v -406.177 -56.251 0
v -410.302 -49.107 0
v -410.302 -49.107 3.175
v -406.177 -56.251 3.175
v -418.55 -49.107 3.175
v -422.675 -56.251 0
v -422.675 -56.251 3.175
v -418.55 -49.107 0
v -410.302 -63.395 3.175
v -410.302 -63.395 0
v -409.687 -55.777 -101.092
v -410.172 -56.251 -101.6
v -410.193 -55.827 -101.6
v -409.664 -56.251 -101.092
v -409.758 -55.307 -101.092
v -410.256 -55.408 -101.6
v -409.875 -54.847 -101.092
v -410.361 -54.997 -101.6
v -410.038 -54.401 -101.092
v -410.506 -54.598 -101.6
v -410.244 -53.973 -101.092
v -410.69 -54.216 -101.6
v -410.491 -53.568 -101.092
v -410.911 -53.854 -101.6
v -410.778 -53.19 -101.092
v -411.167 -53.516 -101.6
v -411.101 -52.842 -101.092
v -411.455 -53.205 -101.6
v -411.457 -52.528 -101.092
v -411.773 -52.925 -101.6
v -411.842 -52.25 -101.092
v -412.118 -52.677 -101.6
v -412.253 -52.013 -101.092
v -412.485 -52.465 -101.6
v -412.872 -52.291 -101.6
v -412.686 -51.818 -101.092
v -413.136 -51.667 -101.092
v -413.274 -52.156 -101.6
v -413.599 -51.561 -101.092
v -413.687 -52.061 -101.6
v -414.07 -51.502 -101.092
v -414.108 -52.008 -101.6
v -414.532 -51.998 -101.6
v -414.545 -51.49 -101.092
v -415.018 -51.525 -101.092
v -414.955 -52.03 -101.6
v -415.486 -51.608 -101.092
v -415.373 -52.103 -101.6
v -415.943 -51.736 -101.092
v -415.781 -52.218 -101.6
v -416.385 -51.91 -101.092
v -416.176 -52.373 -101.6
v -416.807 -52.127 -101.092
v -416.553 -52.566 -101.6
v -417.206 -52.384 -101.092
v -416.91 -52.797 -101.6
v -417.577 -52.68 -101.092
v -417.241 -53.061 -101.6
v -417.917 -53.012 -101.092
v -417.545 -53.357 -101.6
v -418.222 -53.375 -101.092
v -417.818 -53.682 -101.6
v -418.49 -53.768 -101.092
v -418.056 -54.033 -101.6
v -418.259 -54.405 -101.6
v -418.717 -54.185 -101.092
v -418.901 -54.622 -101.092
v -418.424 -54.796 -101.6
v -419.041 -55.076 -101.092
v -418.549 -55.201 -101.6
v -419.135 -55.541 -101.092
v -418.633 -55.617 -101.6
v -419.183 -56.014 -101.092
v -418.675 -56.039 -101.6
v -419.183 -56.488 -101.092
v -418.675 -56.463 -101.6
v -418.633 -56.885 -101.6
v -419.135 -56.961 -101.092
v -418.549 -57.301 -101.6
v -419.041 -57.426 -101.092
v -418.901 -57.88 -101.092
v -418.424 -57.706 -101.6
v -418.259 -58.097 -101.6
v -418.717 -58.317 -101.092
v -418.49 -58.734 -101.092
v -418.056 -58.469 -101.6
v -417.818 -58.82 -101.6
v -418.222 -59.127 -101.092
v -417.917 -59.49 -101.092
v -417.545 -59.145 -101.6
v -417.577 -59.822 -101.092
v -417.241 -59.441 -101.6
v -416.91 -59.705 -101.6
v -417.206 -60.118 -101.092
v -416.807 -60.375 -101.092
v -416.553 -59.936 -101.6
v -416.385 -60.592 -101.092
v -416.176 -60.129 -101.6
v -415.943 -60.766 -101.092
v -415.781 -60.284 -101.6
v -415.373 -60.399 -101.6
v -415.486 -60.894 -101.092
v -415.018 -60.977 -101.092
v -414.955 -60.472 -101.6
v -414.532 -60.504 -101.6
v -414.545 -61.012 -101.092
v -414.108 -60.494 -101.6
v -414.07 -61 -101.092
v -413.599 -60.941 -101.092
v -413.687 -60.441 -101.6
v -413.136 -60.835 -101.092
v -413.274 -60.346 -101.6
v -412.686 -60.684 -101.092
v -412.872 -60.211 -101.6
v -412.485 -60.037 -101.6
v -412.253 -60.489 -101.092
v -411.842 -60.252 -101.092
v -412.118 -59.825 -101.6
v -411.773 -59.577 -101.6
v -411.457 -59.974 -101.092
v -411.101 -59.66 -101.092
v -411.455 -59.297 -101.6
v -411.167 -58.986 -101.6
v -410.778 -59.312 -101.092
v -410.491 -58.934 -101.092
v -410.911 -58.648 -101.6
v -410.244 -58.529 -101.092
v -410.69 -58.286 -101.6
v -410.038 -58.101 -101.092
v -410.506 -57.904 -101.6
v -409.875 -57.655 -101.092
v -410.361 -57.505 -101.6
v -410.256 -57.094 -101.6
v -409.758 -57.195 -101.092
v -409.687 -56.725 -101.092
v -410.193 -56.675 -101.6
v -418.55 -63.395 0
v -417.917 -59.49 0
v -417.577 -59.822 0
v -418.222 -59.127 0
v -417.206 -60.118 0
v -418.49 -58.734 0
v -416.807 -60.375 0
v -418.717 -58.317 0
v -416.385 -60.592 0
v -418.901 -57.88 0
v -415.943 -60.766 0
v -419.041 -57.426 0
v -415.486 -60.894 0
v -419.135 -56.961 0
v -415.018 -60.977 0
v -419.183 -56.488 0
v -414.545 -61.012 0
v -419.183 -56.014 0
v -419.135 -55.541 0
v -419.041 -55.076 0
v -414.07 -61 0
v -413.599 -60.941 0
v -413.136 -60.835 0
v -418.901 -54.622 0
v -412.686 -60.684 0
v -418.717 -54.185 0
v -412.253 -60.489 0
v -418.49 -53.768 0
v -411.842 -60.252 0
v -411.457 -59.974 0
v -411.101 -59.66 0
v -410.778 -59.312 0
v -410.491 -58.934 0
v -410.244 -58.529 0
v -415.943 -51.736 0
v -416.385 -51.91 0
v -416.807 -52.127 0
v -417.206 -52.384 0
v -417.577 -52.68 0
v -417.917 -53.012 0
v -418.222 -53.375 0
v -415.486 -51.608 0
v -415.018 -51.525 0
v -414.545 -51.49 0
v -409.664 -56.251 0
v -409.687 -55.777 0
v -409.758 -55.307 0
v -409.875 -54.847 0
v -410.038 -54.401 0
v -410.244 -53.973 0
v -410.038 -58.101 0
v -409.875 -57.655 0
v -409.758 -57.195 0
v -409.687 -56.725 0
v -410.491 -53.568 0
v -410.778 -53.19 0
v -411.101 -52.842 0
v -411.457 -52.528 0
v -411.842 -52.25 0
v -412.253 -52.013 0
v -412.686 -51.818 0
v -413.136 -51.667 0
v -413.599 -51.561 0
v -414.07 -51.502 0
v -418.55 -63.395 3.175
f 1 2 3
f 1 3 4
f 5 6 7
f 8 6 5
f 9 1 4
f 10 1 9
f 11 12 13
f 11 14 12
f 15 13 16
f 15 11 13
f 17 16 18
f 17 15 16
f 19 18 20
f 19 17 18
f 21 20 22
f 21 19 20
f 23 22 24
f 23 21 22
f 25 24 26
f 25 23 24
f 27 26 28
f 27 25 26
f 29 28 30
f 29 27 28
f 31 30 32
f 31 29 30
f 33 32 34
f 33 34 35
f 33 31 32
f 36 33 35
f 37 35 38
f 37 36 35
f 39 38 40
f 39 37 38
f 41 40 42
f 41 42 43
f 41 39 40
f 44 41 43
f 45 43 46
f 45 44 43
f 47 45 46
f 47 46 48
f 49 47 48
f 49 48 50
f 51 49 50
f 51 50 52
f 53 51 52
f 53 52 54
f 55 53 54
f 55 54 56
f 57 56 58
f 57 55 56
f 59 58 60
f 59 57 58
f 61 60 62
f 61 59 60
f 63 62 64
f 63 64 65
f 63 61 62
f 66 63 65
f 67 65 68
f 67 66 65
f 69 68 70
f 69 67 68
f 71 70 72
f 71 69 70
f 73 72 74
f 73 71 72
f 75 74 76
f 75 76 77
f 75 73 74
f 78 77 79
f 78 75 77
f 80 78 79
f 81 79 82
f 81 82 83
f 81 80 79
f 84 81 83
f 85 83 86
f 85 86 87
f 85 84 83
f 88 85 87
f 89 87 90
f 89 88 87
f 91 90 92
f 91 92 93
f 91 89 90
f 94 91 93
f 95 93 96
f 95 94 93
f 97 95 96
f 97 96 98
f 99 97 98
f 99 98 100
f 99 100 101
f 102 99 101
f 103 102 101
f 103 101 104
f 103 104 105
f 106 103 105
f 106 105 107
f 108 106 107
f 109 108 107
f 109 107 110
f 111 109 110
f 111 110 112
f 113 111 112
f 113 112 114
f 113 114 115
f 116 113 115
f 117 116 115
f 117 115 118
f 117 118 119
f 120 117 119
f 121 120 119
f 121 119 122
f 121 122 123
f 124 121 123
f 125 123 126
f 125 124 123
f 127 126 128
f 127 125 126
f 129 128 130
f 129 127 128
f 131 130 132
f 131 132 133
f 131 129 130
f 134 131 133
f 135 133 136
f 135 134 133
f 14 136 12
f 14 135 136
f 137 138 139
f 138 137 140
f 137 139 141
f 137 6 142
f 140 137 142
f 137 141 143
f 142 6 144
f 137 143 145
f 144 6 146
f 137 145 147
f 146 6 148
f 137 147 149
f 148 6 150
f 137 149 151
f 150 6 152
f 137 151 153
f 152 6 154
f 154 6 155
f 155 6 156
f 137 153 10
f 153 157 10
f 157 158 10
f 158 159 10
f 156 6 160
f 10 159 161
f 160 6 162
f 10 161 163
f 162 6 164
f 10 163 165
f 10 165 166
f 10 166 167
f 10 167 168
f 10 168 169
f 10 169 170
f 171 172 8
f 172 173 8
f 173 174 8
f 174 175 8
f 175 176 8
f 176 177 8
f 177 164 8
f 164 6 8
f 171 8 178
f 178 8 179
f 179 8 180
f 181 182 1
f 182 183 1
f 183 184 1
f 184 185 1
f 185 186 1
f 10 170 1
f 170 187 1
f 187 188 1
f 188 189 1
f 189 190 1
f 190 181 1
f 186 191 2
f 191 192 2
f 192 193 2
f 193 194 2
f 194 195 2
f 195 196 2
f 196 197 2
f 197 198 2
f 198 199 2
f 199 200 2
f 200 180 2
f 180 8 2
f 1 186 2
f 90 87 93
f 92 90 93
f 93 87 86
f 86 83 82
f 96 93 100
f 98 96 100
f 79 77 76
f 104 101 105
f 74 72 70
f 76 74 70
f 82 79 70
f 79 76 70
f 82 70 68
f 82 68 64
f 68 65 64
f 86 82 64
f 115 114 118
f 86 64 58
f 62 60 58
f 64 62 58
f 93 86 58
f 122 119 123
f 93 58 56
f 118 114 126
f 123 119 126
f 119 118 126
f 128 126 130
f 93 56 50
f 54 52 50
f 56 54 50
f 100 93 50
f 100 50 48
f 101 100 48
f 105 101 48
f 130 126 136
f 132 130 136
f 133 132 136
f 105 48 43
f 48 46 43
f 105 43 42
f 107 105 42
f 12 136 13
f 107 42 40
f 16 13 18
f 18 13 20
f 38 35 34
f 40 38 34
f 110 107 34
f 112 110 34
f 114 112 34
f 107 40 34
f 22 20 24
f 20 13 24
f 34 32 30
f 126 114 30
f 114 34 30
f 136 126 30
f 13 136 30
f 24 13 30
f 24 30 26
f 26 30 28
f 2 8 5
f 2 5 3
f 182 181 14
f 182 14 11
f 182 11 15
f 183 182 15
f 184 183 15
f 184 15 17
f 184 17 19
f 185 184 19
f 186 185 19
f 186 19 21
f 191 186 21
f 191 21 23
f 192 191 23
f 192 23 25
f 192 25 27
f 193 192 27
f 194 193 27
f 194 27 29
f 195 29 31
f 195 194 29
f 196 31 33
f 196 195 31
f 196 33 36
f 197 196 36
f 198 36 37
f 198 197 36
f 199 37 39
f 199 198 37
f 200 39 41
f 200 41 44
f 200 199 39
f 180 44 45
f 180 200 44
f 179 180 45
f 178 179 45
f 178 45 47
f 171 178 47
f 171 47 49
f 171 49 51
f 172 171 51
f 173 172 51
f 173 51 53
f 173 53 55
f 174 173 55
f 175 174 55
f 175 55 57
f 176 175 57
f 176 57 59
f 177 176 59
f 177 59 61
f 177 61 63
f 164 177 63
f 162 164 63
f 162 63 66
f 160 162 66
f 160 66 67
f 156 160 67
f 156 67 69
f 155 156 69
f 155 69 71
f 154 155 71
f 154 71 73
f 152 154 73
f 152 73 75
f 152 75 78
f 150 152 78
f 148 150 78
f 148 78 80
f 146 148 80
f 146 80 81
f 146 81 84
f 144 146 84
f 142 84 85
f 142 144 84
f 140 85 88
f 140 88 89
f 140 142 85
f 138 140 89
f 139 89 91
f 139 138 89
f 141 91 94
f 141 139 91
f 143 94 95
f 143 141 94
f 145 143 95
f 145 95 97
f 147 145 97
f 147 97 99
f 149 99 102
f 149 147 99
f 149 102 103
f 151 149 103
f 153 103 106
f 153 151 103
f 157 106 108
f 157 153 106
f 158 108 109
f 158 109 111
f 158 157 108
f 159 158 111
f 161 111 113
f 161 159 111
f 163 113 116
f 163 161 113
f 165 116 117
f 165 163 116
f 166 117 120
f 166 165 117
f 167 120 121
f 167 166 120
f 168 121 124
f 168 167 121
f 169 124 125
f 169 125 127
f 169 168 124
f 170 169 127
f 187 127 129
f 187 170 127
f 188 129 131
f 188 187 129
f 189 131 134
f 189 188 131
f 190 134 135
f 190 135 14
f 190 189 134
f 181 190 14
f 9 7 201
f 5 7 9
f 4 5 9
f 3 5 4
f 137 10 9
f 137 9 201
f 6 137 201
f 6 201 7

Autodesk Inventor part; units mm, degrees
ref_plane "YZ Plane" through (0, 0, 0) normal (1, 0, 0) x (0, 1, 0)
ref_plane "XZ Plane" through (0, 0, 0) normal (0, 1, 0) x (-1, 0, 0)
ref_plane "XY Plane" through (0, 0, 0) normal (0, 0, 1) x (1, 0, 0)
sketch "Sketch1" plane through (0, 0, 0) normal (0, 0, 1) x (1, 0, 0)
  circle A0 centre (-414.4261, -56.251) radius 4.7625
  point P0 (0, 0)
  dimension "d0" = 9.525
extrude "Extrusion1" add sketch "Sketch1" against normal blind 101.6
sketch "Sketch2" plane through (-414.4261, -56.251, 0) normal (0, 0, 1) x (1, 0, 0)
  circle A0 centre (0, 0) radius 4.7625 projected
  line L0 (-8.2489, 0) -> (-4.1244, 7.1437)
  line L1 (-4.1244, 7.1437) -> (4.1244, 7.1438)
  line L2 (4.1244, 7.1438) -> (8.2489, 0)
  line L3 (8.2489, 0) -> (4.1244, -7.1437)
  line L4 (4.1244, -7.1437) -> (-4.1244, -7.1438)
  line L5 (-4.1244, -7.1438) -> (-8.2489, 0)
  point P0 (414.4261, 56.251)
  dimension "d3" = 14.2875
extrude "Extrusion2" add sketch "Sketch2" along normal blind 3.175 contours A0 | L0 L1 L2 L3 L4 L5
thread "Thread1" size "3/8-16 UNC" class "2A" standard "ANSI Unified Screw Threads" length 25.4
chamfer "Chamfer1" distance 0.508 angle 45 1 edges at (-419.1886, -56.251, -101.6)
properties part number "375 bolt x4" material "Steel"
